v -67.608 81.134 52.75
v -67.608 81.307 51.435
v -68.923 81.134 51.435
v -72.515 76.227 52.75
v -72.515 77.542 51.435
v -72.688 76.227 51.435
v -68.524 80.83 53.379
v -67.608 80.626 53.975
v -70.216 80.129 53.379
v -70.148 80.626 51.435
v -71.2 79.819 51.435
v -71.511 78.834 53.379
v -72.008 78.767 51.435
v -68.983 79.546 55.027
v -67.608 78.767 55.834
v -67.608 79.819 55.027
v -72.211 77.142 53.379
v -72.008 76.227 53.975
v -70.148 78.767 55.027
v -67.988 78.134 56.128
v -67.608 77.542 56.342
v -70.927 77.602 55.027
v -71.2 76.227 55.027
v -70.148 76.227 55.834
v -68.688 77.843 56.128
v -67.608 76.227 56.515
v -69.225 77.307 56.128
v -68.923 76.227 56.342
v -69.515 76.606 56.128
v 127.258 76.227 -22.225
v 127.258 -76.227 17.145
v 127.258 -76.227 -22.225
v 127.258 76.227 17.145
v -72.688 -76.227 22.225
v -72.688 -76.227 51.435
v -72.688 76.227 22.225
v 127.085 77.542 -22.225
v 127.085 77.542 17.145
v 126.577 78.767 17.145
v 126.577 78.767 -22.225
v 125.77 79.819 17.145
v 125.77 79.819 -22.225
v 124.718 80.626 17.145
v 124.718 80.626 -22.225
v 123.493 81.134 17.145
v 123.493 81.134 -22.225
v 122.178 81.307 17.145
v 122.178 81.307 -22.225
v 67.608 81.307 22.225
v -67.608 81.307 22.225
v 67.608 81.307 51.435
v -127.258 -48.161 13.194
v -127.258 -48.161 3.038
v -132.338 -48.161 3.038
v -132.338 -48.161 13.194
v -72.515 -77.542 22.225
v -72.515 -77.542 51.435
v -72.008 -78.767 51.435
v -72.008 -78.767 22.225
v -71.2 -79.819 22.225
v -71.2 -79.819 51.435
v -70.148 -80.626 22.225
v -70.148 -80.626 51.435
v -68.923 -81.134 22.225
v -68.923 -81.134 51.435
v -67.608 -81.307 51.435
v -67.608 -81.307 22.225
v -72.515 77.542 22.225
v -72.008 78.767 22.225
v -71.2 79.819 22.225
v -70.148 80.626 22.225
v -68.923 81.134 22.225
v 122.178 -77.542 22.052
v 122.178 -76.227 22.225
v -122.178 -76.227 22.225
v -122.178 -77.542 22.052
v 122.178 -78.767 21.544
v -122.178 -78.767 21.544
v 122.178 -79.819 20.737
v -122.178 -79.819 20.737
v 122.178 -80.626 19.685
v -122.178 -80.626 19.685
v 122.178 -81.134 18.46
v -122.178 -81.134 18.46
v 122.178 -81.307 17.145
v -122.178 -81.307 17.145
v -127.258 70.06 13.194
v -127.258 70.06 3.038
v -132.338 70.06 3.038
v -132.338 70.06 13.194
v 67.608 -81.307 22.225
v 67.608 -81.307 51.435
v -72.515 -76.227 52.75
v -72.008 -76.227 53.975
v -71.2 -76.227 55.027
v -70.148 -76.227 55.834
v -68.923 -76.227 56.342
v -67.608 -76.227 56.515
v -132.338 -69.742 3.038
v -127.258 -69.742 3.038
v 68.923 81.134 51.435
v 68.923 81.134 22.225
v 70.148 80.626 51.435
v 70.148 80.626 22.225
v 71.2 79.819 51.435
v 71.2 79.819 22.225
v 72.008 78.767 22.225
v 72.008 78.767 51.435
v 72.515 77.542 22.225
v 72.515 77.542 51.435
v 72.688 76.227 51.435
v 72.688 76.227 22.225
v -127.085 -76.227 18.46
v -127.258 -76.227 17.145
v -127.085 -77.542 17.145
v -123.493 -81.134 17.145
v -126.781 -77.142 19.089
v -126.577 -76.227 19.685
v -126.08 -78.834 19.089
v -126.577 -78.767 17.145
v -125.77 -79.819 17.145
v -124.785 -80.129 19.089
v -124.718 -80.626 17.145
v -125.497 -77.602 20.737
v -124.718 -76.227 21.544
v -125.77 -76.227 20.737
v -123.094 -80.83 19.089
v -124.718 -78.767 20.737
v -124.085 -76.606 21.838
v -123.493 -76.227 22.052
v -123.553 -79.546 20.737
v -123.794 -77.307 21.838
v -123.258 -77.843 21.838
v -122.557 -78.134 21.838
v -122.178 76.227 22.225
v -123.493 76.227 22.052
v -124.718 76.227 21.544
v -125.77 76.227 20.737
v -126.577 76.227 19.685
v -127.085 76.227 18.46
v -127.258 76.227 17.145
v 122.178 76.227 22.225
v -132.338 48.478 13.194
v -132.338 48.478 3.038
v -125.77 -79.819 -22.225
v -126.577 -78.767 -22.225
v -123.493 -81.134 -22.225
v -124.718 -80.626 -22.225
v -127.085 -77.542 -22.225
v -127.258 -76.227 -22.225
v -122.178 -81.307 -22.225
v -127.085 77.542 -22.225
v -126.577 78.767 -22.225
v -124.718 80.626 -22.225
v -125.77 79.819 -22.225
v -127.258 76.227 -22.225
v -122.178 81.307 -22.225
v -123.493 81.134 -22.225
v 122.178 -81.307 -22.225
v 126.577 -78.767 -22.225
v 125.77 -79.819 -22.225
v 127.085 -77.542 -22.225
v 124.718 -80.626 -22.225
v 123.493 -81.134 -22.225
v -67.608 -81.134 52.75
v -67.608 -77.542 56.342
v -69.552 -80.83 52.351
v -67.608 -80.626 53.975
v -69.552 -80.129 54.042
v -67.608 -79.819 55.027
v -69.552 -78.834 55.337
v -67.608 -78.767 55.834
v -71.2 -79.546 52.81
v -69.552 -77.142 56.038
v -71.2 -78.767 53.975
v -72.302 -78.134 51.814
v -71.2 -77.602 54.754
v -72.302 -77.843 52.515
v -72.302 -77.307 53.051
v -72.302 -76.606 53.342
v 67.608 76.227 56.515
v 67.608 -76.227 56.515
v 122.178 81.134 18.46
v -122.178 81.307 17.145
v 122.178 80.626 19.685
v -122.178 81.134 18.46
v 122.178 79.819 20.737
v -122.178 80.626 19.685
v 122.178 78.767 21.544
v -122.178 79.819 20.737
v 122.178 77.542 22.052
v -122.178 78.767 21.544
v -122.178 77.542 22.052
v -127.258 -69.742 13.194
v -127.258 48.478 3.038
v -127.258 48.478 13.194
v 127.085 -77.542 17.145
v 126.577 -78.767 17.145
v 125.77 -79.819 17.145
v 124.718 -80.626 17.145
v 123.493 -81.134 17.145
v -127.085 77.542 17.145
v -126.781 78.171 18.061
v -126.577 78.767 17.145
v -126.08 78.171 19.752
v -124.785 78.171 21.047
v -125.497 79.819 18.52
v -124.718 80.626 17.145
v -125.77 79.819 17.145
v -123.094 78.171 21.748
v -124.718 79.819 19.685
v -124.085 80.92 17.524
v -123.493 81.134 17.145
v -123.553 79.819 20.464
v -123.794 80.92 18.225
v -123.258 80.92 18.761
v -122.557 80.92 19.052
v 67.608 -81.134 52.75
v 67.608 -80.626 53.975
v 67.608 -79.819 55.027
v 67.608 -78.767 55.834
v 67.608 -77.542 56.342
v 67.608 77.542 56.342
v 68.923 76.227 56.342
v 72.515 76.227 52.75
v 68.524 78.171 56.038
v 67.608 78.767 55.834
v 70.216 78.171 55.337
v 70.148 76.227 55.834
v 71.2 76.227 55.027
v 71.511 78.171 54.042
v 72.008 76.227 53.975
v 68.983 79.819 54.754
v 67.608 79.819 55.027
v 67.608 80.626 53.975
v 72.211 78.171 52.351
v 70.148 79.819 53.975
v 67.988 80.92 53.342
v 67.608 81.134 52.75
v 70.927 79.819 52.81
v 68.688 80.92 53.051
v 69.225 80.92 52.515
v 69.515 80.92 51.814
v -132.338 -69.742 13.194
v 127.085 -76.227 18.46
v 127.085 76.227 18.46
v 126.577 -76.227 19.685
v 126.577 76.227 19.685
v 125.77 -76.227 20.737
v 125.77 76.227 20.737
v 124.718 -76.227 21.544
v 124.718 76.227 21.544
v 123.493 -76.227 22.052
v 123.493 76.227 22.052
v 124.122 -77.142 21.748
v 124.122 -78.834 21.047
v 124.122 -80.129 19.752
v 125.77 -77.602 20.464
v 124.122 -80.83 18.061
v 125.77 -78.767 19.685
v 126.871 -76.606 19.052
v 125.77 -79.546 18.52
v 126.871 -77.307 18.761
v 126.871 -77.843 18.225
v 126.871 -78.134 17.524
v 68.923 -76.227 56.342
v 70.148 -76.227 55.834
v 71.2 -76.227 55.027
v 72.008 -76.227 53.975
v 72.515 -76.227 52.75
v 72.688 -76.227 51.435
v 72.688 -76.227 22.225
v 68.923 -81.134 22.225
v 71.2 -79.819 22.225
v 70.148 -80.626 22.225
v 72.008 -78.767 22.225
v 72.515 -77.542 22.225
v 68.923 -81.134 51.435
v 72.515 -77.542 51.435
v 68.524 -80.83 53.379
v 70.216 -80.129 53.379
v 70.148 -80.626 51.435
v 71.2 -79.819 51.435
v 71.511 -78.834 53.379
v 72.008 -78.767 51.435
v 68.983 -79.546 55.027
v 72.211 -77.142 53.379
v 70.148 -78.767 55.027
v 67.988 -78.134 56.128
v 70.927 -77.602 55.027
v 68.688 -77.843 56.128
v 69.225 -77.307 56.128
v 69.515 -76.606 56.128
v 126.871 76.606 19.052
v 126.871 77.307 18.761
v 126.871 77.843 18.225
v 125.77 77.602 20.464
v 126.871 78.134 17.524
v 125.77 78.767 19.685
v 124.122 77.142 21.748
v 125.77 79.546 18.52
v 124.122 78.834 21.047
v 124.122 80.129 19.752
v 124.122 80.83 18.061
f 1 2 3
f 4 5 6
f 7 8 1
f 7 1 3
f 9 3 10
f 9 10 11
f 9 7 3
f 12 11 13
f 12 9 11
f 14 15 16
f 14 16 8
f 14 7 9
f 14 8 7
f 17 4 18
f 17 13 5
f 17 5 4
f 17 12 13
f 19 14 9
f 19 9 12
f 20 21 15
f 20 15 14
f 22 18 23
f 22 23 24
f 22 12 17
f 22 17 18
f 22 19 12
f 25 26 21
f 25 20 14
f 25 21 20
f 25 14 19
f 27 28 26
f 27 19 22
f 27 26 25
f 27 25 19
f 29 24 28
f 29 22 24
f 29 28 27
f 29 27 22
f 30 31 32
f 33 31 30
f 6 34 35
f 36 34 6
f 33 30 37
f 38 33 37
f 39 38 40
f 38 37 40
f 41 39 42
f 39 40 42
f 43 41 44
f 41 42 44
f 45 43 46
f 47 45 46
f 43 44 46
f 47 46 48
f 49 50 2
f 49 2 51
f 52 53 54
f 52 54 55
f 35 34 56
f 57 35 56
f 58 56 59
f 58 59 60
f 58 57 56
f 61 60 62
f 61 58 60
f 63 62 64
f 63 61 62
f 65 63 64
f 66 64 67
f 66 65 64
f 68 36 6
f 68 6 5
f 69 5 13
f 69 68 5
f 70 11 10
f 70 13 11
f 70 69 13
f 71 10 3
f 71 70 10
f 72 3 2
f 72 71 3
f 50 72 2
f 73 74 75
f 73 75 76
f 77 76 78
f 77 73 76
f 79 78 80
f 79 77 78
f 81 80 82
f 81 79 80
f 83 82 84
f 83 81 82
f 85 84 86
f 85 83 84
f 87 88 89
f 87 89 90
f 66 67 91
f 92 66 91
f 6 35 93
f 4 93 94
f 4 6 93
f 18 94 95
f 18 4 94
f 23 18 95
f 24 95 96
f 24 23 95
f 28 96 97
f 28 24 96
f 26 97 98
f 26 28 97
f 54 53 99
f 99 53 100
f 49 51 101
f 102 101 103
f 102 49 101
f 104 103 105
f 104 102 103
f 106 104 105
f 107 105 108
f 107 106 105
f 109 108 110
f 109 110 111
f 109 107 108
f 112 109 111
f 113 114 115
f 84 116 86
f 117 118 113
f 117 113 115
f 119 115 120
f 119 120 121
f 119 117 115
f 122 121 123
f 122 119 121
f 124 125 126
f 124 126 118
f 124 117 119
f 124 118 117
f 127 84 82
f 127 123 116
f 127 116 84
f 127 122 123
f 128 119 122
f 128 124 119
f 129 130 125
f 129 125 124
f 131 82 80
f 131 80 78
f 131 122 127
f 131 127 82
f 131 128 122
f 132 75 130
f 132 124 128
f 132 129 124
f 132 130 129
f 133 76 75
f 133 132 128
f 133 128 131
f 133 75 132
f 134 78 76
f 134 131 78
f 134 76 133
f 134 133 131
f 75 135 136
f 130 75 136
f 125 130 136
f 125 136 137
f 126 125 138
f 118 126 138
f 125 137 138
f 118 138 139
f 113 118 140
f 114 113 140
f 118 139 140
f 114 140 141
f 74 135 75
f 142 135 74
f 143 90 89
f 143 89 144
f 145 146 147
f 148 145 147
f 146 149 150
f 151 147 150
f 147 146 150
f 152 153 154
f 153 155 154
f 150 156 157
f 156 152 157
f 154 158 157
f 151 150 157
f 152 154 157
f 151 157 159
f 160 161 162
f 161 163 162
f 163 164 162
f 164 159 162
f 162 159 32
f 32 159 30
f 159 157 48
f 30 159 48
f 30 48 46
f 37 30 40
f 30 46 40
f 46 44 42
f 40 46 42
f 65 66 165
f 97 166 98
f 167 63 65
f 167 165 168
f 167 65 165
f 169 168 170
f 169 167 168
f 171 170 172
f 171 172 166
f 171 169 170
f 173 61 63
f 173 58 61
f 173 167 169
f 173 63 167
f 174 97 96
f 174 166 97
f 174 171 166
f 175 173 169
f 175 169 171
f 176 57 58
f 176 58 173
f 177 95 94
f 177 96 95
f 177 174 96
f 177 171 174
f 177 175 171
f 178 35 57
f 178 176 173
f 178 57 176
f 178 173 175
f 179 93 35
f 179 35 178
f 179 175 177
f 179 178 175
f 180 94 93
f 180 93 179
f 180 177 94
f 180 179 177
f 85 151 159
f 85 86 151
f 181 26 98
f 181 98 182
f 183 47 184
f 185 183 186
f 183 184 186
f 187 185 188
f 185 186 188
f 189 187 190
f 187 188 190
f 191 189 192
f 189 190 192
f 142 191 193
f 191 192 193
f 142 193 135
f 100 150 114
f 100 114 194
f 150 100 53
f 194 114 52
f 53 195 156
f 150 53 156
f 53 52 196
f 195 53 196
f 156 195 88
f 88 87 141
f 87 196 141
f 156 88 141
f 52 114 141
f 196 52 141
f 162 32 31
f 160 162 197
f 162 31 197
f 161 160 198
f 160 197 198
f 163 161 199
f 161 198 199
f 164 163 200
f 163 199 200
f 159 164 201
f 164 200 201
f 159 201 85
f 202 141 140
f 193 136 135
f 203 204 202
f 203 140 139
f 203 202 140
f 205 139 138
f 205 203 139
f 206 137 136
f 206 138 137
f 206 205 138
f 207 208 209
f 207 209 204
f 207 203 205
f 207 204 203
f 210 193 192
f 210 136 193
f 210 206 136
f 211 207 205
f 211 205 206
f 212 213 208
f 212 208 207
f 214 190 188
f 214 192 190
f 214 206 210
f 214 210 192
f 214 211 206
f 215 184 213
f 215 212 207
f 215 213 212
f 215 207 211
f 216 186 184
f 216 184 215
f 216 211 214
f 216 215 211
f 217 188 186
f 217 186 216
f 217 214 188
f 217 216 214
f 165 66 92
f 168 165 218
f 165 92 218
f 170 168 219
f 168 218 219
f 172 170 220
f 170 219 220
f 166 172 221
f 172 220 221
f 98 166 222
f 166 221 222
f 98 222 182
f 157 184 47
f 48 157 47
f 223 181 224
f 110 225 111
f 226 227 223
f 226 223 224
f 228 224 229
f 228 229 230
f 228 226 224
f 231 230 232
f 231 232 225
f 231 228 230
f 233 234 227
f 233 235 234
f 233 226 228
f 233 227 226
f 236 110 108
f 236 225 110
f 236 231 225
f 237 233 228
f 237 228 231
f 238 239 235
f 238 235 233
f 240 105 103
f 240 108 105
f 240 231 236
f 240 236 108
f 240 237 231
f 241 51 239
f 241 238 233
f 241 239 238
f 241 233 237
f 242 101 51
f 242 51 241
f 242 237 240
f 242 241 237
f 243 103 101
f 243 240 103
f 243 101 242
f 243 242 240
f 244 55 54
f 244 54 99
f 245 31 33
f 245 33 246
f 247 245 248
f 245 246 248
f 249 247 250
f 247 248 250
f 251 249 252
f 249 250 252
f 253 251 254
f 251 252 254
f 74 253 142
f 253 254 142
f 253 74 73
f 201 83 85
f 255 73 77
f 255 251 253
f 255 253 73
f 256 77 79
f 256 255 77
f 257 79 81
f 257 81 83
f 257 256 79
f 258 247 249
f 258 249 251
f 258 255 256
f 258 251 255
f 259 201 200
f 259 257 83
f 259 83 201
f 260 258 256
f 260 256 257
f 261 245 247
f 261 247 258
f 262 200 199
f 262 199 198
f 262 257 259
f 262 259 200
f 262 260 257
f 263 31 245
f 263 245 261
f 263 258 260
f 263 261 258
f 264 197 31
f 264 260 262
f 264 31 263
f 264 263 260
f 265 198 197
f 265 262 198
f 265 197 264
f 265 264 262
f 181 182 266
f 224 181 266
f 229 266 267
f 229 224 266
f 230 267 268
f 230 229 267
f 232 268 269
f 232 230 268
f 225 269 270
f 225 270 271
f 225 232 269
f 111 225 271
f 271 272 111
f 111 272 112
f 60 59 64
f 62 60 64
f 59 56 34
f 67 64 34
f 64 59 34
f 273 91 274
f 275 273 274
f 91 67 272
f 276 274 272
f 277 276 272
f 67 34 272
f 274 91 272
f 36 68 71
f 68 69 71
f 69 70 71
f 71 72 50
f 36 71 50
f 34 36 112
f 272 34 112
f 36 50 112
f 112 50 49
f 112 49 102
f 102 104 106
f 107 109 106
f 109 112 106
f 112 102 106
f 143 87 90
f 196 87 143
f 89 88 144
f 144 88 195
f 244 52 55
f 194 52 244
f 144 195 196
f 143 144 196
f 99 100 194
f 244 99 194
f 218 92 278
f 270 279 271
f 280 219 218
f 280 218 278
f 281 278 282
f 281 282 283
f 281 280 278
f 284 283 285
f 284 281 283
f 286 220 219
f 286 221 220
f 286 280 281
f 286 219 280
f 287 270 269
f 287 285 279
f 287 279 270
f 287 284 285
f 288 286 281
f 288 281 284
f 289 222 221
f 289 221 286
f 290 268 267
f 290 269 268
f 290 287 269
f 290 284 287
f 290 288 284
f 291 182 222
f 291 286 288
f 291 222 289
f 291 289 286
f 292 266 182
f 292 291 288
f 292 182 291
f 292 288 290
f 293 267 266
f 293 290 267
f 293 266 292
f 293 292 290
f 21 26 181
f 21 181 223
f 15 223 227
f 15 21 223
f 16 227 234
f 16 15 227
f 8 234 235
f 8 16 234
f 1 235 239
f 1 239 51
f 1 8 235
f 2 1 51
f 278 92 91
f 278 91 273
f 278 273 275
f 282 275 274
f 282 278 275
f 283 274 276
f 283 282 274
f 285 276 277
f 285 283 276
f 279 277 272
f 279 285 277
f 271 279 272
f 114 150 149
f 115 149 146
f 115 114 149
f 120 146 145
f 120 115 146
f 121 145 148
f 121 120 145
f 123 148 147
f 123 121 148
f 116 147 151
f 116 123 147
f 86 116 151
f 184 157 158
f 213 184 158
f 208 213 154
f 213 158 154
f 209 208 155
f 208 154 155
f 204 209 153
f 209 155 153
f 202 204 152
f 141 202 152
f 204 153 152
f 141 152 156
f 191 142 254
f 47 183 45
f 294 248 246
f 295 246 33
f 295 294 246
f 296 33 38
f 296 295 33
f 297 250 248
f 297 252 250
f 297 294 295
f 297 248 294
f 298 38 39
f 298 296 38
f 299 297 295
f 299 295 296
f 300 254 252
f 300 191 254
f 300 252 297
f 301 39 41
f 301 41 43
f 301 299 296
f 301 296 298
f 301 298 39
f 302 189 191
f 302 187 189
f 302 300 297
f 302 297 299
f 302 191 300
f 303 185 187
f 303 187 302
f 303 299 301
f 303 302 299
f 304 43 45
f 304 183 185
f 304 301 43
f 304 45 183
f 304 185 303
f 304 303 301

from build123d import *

# Parameters (mm, degrees)
F0_W            = 254.5158863068
F0_H            = 162.6137495041
F1_DEPTH        = 22.225
F2_W            = 145.3766971827
F2_H            = 162.6137495041
F3_DEPTH        = 34.29
F9_R            = 5.08
F10_R           = 5.08
F11_T1_DEPTH    = 170.2337495041
F11_T3_DEPTH    = 59.69
F11_S7_W        = 5.08
F11_S7_H        = 5.08
F11_T8_DEPTH    = 5.08
F12_T1_DEPTH    = 152.4537495041
F12_T3_DEPTH    = 52.07
F12_T5_DEPTH    = 262.1358863068
F12_S9_W        = 5.08
F12_S9_H        = 5.08
F12_T10_DEPTH   = 5.08
F12_S15_W       = 5.08
F12_S15_H       = 5.08
F12_T16_DEPTH   = 5.08
F13_T1_DEPTH    = 152.4537495041
F13_T3_DEPTH    = 41.91
F13_T5_DEPTH    = 135.2166971826
F13_S9_W        = 5.08
F13_S9_H        = 5.08
F13_T10_DEPTH   = 5.08
F13_S15_W       = 5.08
F13_S15_H       = 5.08
F13_T16_DEPTH   = 5.08
F13_S21_W       = 5.08
F13_S21_H       = 5.08
F13_T22_DEPTH   = 5.08
F13_2_T1_DEPTH  = 152.453749504
F13_2_T3_DEPTH  = 52.07
F13_2_S7_W      = 5.08
F13_2_S7_H      = 5.08
F13_2_T8_DEPTH  = 5.08
F13_2_T12_ANGLE = 90.0000000017
F14_W           = 21.5812288225
F14_H           = 10.1558715105
F15_DEPTH       = 5.08


# Not quite as in the source:
# - a fillet or chamfer that OpenCascade refuses, or shapes differently, is made with other operations: its cross-section is extruded or revolved along the edge and cut away or added


with BuildPart() as f1:
    # F0 (on Top) → F1 (new body, symmetric)
    with BuildSketch(Plane.XY):
        Rectangle(F0_W, F0_H)
    extrude(amount=F1_DEPTH, both=True)

    # F10
    f10_edges = [f1.edges().sort_by_distance(p)[0] for p in [
        (0, -81.306875, 22.225),
        (-127.257943, -81.306875, 0),
        (127.257943, -81.306875, 0),
    ]]
    fillet(f10_edges, radius=F10_R)

    # F12: fillet of radius 5.08 on 3 edges, made by hand

    # F12_s2 → F12_t1 (cut)
    with BuildSketch(Plane.XZ.offset(-76.226874752)):
        with BuildLine():
            ThreePointArc((-122.1779431534, 22.225), (-125.7700456018, 20.7371024484), (-127.2579431534, 17.145))
            Line((-127.2579431534, 17.145), (-127.2579431534, 22.225))
            Line((-127.2579431534, 22.225), (-122.1779431534, 22.225))
        make_face()
    extrude(amount=F12_T1_DEPTH, mode=Mode.SUBTRACT)

    # F12_s4 → F12_t3 (cut)
    with BuildSketch(Plane.XY.offset(-34.925)):
        with BuildLine():
            ThreePointArc((-122.1779431534, 81.306874752), (-125.7700456018, 79.8189772005), (-127.2579431534, 76.226874752))
            Line((-127.2579431534, 76.226874752), (-127.2579431534, 81.306874752))
            Line((-127.2579431534, 81.306874752), (-122.1779431534, 81.306874752))
        make_face()
    extrude(amount=F12_T3_DEPTH, mode=Mode.SUBTRACT)

    # F12_s6 → F12_t5 (cut)
    with BuildSketch(Plane.YZ.offset(-122.1779431534)):
        with BuildLine():
            ThreePointArc((81.306874752, 17.145), (79.8189772005, 20.7371024484), (76.226874752, 22.225))
            Line((76.226874752, 22.225), (81.306874752, 22.225))
            Line((81.306874752, 22.225), (81.306874752, 17.145))
        make_face()
    extrude(amount=F12_T5_DEPTH, mode=Mode.SUBTRACT)


with BuildPart() as f3:
    # F2 (on face) → F3 (new body)
    with BuildSketch(Plane.XY.offset(22.225)):
        Rectangle(F2_W, F2_H)
    extrude(amount=F3_DEPTH)

    # F9
    f9_edges = [f3.edges().sort_by_distance(p)[0] for p in [
        (0, -81.306875, 56.515),
        (-72.688349, -81.306875, 39.37),
        (72.688349, -81.306875, 39.37),
    ]]
    fillet(f9_edges, radius=F9_R)

    # F11: fillet of radius 5.08 on 2 edges, made by hand

    # F11_s2 → F11_t1 (cut)
    with BuildSketch(Plane.XZ.offset(-94.006874752)):
        with BuildLine():
            ThreePointArc((-72.6883485913, 51.435), (-71.2004510398, 55.0271024484), (-67.6083485913, 56.515))
            Line((-67.6083485913, 56.515), (-72.6883485913, 56.515))
            Line((-72.6883485913, 56.515), (-72.6883485913, 51.435))
        make_face()
    extrude(amount=F11_T1_DEPTH, mode=Mode.SUBTRACT)

    # F11_s4 → F11_t3 (cut)
    with BuildSketch(Plane.XY.offset(9.525)):
        with BuildLine():
            ThreePointArc((-72.6883485913, 76.226874752), (-71.2004510398, 79.8189772005), (-67.6083485913, 81.306874752))
            Line((-67.6083485913, 81.306874752), (-72.6883485913, 81.306874752))
            Line((-72.6883485913, 81.306874752), (-72.6883485913, 76.226874752))
        make_face()
    extrude(amount=F11_T3_DEPTH, mode=Mode.SUBTRACT)


with BuildPart() as f11_tool6:
    # F11_s7 → F11_t8 (new body)
    with BuildSketch(Plane.YZ.offset(-67.6083485913)):
        with Locations((-78.766874752, 53.975)):
            Rectangle(F11_S7_W, F11_S7_H)
    extrude(amount=-F11_T8_DEPTH)

    # F11_s9 → F11_t10 (revolve, cut)
    with BuildSketch(Plane(origin=(-67.6083485913, -76.226874752, 51.435), x_dir=(0, 0.7071067812, -0.7071067812), z_dir=(0, 0.7071067812, 0.7071067812))):
        with BuildLine():
            ThreePointArc((0, -5.08), (5.08, 0), (0, 5.08))
            Line((0, 5.08), (0, -5.08))
        make_face()
    revolve(axis=Axis((-67.6083485913, -76.226874752, 51.435), (-1, 0, 0)), mode=Mode.SUBTRACT)


with BuildPart() as f3_1:
    add(f3.part)

    # F11_t5: cut F11_tool6
    add(f11_tool6.part, mode=Mode.SUBTRACT)

    # F13: fillet of radius 5.08 on 3 edges, made by hand

    # F13_s2 → F13_t1 (cut)
    with BuildSketch(Plane.XZ.offset(-76.226874752)):
        with BuildLine():
            ThreePointArc((67.6083485913, 56.515), (71.2004510398, 55.0271024484), (72.6883485913, 51.435))
            Line((72.6883485913, 51.435), (72.6883485913, 56.515))
            Line((72.6883485913, 56.515), (67.6083485913, 56.515))
        make_face()
    extrude(amount=F13_T1_DEPTH, mode=Mode.SUBTRACT)

    # F13_s4 → F13_t3 (cut)
    with BuildSketch(Plane.XY.offset(9.525)):
        with BuildLine():
            ThreePointArc((67.6083485913, 81.306874752), (71.2004510398, 79.8189772005), (72.6883485913, 76.226874752))
            Line((72.6883485913, 76.226874752), (72.6883485913, 81.306874752))
            Line((72.6883485913, 81.306874752), (67.6083485913, 81.306874752))
        make_face()
    extrude(amount=F13_T3_DEPTH, mode=Mode.SUBTRACT)

    # F13_s6 → F13_t5 (cut)
    with BuildSketch(Plane.YZ.offset(-67.6083485913)):
        with BuildLine():
            ThreePointArc((76.226874752, 56.515), (79.8189772005, 55.0271024484), (81.306874752, 51.435))
            Line((81.306874752, 51.435), (81.306874752, 56.515))
            Line((81.306874752, 56.515), (76.226874752, 56.515))
        make_face()
    extrude(amount=F13_T5_DEPTH, mode=Mode.SUBTRACT)


with BuildPart() as f12_tool8:
    # F12_s9 → F12_t10 (new body)
    with BuildSketch(Plane.XY.offset(17.145)):
        with Locations((-124.7179431534, -78.766874752)):
            Rectangle(F12_S9_W, F12_S9_H)
    extrude(amount=F12_T10_DEPTH)

    # F12_s11 → F12_t12 (revolve, cut)
    with BuildSketch(Plane(origin=(-122.1779431534, -76.226874752, 17.145), x_dir=(0.7071067812, 0.7071067812, 0), z_dir=(0.7071067812, -0.7071067812, 0))):
        with BuildLine():
            ThreePointArc((0, -5.08), (5.08, 0), (0, 5.08))
            Line((0, 5.08), (0, -5.08))
        make_face()
    revolve(axis=Axis((-122.1779431534, -76.226874752, 17.145), (0, 0, 1)), mode=Mode.SUBTRACT)


with BuildPart() as f1_1:
    add(f1.part)

    # F12_t7: cut F12_tool8
    add(f12_tool8.part, mode=Mode.SUBTRACT)


with BuildPart() as f12_tool14:
    # F12_s15 → F12_t16 (new body)
    with BuildSketch(Plane.XZ.offset(-76.226874752)):
        with Locations((-124.7179431534, 19.685)):
            Rectangle(F12_S15_W, F12_S15_H)
    extrude(amount=-F12_T16_DEPTH)

    # F12_s17 → F12_t18 (revolve, cut)
    with BuildSketch(Plane(origin=(-122.1779431534, 76.226874752, 17.145), x_dir=(0.7071067812, 0, -0.7071067812), z_dir=(0.7071067812, 0, 0.7071067812))):
        with BuildLine():
            ThreePointArc((0, -5.08), (5.08, 0), (0, 5.08))
            Line((0, 5.08), (0, -5.08))
        make_face()
    revolve(axis=Axis((-122.1779431534, 76.226874752, 17.145), (0, 1, 0)), mode=Mode.SUBTRACT)


with BuildPart() as f1_2:
    add(f1_1.part)

    # F12_t13: cut F12_tool14
    add(f12_tool14.part, mode=Mode.SUBTRACT)

    # F13#2: fillet of radius 5.08 on 1 edges, made by hand

    # F13_2_s2 → F13_2_t1 (cut)
    with BuildSketch(Plane.XZ.offset(-76.226874752)):
        with BuildLine():
            ThreePointArc((127.2579431534, 17.145), (125.7700456018, 20.7371024484), (122.1779431534, 22.225))
            Line((122.1779431534, 22.225), (127.2579431534, 22.225))
            Line((127.2579431534, 22.225), (127.2579431534, 17.145))
        make_face()
    extrude(amount=F13_2_T1_DEPTH, mode=Mode.SUBTRACT)

    # F13_2_s4 → F13_2_t3 (cut)
    with BuildSketch(Plane.XY.offset(-34.925)):
        with BuildLine():
            ThreePointArc((127.2579431534, 76.226874752), (125.7700456018, 79.8189772005), (122.1779431534, 81.306874752))
            Line((122.1779431534, 81.306874752), (127.2579431534, 81.306874752))
            Line((127.2579431534, 81.306874752), (127.2579431534, 76.226874752))
        make_face()
    extrude(amount=F13_2_T3_DEPTH, mode=Mode.SUBTRACT)


with BuildPart() as f13_tool8:
    # F13_s9 → F13_t10 (new body)
    with BuildSketch(Plane.XY.offset(51.435)):
        with Locations((-70.1483485913, 78.766874752)):
            Rectangle(F13_S9_W, F13_S9_H)
    extrude(amount=F13_T10_DEPTH)

    # F13_s11 → F13_t12 (revolve, cut)
    with BuildSketch(Plane(origin=(-67.6083485913, 76.226874752, 51.435), x_dir=(0.7071067812, -0.7071067812, 0), z_dir=(-0.7071067812, -0.7071067812, 0))):
        with BuildLine():
            ThreePointArc((0, -5.08), (5.08, 0), (0, 5.08))
            Line((0, 5.08), (0, -5.08))
        make_face()
    revolve(axis=Axis((-67.6083485913, 76.226874752, 51.435), (0, 0, 1)), mode=Mode.SUBTRACT)


with BuildPart() as f3_2:
    add(f3_1.part)

    # F13_t7: cut F13_tool8
    add(f13_tool8.part, mode=Mode.SUBTRACT)


with BuildPart() as f13_tool14:
    # F13_s15 → F13_t16 (new body)
    with BuildSketch(Plane.XY.offset(51.435)):
        with Locations((70.1483485913, -78.766874752)):
            Rectangle(F13_S15_W, F13_S15_H)
    extrude(amount=F13_T16_DEPTH)

    # F13_s17 → F13_t18 (revolve, cut)
    with BuildSketch(Plane(origin=(67.6083485913, -76.226874752, 51.435), x_dir=(-0.7071067812, 0.7071067812, 0), z_dir=(0.7071067812, 0.7071067812, 0))):
        with BuildLine():
            ThreePointArc((0, -5.08), (5.08, 0), (0, 5.08))
            Line((0, 5.08), (0, -5.08))
        make_face()
    revolve(axis=Axis((67.6083485913, -76.226874752, 51.435), (0, 0, 1)), mode=Mode.SUBTRACT)


with BuildPart() as f3_3:
    add(f3_2.part)

    # F13_t13: cut F13_tool14
    add(f13_tool14.part, mode=Mode.SUBTRACT)


with BuildPart() as f13_tool20:
    # F13_s21 → F13_t22 (new body)
    with BuildSketch(Plane.XZ.offset(-76.226874752)):
        with Locations((70.1483485913, 53.975)):
            Rectangle(F13_S21_W, F13_S21_H)
    extrude(amount=-F13_T22_DEPTH)

    # F13_s23 → F13_t24 (revolve, cut)
    with BuildSketch(Plane(origin=(67.6083485913, 76.226874752, 51.435), x_dir=(-0.7071067812, 0, -0.7071067812), z_dir=(0.7071067812, 0, -0.7071067812))):
        with BuildLine():
            ThreePointArc((0, -5.08), (5.08, 0), (0, 5.08))
            Line((0, 5.08), (0, -5.08))
        make_face()
    revolve(axis=Axis((67.6083485913, 76.226874752, 51.435), (0, 1, 0)), mode=Mode.SUBTRACT)


with BuildPart() as f3_4:
    add(f3_3.part)

    # F13_t19: cut F13_tool20
    add(f13_tool20.part, mode=Mode.SUBTRACT)


with BuildPart() as f13_2_tool6:
    # F13_2_s7 → F13_2_t8 (new body)
    with BuildSketch(Plane.YZ.offset(122.1779431534)):
        with Locations((-78.766874752, 19.685)):
            Rectangle(F13_2_S7_W, F13_2_S7_H)
    extrude(amount=F13_2_T8_DEPTH)

    # F13_2_s9 → F13_2_t10 (revolve, cut)
    with BuildSketch(Plane(origin=(122.1779431534, -76.226874752, 17.145), x_dir=(0, 0.7071067812, -0.7071067812), z_dir=(0, -0.7071067812, -0.7071067812))):
        with BuildLine():
            ThreePointArc((0, -5.08), (5.08, 0), (0, 5.08))
            Line((0, 5.08), (0, -5.08))
        make_face()
    revolve(axis=Axis((122.1779431534, -76.226874752, 17.145), (1, 0, 0)), mode=Mode.SUBTRACT)


with BuildPart() as f1_3:
    add(f1_2.part)

    # F13_2_t5: cut F13_2_tool6
    add(f13_2_tool6.part, mode=Mode.SUBTRACT)

    # F13_2_s11 → F13_2_t12 (revolve, cut)
    with BuildSketch(Plane.XZ.offset(-76.2268747521)):
        with BuildLine():
            ThreePointArc((127.2579431534, 17.145), (125.7700456018, 20.7371024484), (122.1779431534, 22.225))
            Line((122.1779431534, 22.225), (127.2579431534, 22.225))
            Line((127.2579431534, 22.225), (127.2579431534, 17.145))
        make_face()
    revolve(axis=Axis((127.2579431534, 76.2268747521, 17.1450000001), (-1, 0, 0)), revolution_arc=F13_2_T12_ANGLE, mode=Mode.SUBTRACT)

    # F14 (on face) → F15 (join)
    with BuildSketch(Plane(origin=(-127.2579431534, 0, 0), x_dir=(0, -1, 0), z_dir=(-1, 0, 0))):
        with Locations((-59.269035235, 8.1159230322)):
            Rectangle(F14_W, F14_H)
        with Locations((58.9516628534, 8.1159230322)):
            Rectangle(F14_W, F14_H)
    extrude(amount=F15_DEPTH)


solid = Compound([f3_4.part, f1_3.part])
